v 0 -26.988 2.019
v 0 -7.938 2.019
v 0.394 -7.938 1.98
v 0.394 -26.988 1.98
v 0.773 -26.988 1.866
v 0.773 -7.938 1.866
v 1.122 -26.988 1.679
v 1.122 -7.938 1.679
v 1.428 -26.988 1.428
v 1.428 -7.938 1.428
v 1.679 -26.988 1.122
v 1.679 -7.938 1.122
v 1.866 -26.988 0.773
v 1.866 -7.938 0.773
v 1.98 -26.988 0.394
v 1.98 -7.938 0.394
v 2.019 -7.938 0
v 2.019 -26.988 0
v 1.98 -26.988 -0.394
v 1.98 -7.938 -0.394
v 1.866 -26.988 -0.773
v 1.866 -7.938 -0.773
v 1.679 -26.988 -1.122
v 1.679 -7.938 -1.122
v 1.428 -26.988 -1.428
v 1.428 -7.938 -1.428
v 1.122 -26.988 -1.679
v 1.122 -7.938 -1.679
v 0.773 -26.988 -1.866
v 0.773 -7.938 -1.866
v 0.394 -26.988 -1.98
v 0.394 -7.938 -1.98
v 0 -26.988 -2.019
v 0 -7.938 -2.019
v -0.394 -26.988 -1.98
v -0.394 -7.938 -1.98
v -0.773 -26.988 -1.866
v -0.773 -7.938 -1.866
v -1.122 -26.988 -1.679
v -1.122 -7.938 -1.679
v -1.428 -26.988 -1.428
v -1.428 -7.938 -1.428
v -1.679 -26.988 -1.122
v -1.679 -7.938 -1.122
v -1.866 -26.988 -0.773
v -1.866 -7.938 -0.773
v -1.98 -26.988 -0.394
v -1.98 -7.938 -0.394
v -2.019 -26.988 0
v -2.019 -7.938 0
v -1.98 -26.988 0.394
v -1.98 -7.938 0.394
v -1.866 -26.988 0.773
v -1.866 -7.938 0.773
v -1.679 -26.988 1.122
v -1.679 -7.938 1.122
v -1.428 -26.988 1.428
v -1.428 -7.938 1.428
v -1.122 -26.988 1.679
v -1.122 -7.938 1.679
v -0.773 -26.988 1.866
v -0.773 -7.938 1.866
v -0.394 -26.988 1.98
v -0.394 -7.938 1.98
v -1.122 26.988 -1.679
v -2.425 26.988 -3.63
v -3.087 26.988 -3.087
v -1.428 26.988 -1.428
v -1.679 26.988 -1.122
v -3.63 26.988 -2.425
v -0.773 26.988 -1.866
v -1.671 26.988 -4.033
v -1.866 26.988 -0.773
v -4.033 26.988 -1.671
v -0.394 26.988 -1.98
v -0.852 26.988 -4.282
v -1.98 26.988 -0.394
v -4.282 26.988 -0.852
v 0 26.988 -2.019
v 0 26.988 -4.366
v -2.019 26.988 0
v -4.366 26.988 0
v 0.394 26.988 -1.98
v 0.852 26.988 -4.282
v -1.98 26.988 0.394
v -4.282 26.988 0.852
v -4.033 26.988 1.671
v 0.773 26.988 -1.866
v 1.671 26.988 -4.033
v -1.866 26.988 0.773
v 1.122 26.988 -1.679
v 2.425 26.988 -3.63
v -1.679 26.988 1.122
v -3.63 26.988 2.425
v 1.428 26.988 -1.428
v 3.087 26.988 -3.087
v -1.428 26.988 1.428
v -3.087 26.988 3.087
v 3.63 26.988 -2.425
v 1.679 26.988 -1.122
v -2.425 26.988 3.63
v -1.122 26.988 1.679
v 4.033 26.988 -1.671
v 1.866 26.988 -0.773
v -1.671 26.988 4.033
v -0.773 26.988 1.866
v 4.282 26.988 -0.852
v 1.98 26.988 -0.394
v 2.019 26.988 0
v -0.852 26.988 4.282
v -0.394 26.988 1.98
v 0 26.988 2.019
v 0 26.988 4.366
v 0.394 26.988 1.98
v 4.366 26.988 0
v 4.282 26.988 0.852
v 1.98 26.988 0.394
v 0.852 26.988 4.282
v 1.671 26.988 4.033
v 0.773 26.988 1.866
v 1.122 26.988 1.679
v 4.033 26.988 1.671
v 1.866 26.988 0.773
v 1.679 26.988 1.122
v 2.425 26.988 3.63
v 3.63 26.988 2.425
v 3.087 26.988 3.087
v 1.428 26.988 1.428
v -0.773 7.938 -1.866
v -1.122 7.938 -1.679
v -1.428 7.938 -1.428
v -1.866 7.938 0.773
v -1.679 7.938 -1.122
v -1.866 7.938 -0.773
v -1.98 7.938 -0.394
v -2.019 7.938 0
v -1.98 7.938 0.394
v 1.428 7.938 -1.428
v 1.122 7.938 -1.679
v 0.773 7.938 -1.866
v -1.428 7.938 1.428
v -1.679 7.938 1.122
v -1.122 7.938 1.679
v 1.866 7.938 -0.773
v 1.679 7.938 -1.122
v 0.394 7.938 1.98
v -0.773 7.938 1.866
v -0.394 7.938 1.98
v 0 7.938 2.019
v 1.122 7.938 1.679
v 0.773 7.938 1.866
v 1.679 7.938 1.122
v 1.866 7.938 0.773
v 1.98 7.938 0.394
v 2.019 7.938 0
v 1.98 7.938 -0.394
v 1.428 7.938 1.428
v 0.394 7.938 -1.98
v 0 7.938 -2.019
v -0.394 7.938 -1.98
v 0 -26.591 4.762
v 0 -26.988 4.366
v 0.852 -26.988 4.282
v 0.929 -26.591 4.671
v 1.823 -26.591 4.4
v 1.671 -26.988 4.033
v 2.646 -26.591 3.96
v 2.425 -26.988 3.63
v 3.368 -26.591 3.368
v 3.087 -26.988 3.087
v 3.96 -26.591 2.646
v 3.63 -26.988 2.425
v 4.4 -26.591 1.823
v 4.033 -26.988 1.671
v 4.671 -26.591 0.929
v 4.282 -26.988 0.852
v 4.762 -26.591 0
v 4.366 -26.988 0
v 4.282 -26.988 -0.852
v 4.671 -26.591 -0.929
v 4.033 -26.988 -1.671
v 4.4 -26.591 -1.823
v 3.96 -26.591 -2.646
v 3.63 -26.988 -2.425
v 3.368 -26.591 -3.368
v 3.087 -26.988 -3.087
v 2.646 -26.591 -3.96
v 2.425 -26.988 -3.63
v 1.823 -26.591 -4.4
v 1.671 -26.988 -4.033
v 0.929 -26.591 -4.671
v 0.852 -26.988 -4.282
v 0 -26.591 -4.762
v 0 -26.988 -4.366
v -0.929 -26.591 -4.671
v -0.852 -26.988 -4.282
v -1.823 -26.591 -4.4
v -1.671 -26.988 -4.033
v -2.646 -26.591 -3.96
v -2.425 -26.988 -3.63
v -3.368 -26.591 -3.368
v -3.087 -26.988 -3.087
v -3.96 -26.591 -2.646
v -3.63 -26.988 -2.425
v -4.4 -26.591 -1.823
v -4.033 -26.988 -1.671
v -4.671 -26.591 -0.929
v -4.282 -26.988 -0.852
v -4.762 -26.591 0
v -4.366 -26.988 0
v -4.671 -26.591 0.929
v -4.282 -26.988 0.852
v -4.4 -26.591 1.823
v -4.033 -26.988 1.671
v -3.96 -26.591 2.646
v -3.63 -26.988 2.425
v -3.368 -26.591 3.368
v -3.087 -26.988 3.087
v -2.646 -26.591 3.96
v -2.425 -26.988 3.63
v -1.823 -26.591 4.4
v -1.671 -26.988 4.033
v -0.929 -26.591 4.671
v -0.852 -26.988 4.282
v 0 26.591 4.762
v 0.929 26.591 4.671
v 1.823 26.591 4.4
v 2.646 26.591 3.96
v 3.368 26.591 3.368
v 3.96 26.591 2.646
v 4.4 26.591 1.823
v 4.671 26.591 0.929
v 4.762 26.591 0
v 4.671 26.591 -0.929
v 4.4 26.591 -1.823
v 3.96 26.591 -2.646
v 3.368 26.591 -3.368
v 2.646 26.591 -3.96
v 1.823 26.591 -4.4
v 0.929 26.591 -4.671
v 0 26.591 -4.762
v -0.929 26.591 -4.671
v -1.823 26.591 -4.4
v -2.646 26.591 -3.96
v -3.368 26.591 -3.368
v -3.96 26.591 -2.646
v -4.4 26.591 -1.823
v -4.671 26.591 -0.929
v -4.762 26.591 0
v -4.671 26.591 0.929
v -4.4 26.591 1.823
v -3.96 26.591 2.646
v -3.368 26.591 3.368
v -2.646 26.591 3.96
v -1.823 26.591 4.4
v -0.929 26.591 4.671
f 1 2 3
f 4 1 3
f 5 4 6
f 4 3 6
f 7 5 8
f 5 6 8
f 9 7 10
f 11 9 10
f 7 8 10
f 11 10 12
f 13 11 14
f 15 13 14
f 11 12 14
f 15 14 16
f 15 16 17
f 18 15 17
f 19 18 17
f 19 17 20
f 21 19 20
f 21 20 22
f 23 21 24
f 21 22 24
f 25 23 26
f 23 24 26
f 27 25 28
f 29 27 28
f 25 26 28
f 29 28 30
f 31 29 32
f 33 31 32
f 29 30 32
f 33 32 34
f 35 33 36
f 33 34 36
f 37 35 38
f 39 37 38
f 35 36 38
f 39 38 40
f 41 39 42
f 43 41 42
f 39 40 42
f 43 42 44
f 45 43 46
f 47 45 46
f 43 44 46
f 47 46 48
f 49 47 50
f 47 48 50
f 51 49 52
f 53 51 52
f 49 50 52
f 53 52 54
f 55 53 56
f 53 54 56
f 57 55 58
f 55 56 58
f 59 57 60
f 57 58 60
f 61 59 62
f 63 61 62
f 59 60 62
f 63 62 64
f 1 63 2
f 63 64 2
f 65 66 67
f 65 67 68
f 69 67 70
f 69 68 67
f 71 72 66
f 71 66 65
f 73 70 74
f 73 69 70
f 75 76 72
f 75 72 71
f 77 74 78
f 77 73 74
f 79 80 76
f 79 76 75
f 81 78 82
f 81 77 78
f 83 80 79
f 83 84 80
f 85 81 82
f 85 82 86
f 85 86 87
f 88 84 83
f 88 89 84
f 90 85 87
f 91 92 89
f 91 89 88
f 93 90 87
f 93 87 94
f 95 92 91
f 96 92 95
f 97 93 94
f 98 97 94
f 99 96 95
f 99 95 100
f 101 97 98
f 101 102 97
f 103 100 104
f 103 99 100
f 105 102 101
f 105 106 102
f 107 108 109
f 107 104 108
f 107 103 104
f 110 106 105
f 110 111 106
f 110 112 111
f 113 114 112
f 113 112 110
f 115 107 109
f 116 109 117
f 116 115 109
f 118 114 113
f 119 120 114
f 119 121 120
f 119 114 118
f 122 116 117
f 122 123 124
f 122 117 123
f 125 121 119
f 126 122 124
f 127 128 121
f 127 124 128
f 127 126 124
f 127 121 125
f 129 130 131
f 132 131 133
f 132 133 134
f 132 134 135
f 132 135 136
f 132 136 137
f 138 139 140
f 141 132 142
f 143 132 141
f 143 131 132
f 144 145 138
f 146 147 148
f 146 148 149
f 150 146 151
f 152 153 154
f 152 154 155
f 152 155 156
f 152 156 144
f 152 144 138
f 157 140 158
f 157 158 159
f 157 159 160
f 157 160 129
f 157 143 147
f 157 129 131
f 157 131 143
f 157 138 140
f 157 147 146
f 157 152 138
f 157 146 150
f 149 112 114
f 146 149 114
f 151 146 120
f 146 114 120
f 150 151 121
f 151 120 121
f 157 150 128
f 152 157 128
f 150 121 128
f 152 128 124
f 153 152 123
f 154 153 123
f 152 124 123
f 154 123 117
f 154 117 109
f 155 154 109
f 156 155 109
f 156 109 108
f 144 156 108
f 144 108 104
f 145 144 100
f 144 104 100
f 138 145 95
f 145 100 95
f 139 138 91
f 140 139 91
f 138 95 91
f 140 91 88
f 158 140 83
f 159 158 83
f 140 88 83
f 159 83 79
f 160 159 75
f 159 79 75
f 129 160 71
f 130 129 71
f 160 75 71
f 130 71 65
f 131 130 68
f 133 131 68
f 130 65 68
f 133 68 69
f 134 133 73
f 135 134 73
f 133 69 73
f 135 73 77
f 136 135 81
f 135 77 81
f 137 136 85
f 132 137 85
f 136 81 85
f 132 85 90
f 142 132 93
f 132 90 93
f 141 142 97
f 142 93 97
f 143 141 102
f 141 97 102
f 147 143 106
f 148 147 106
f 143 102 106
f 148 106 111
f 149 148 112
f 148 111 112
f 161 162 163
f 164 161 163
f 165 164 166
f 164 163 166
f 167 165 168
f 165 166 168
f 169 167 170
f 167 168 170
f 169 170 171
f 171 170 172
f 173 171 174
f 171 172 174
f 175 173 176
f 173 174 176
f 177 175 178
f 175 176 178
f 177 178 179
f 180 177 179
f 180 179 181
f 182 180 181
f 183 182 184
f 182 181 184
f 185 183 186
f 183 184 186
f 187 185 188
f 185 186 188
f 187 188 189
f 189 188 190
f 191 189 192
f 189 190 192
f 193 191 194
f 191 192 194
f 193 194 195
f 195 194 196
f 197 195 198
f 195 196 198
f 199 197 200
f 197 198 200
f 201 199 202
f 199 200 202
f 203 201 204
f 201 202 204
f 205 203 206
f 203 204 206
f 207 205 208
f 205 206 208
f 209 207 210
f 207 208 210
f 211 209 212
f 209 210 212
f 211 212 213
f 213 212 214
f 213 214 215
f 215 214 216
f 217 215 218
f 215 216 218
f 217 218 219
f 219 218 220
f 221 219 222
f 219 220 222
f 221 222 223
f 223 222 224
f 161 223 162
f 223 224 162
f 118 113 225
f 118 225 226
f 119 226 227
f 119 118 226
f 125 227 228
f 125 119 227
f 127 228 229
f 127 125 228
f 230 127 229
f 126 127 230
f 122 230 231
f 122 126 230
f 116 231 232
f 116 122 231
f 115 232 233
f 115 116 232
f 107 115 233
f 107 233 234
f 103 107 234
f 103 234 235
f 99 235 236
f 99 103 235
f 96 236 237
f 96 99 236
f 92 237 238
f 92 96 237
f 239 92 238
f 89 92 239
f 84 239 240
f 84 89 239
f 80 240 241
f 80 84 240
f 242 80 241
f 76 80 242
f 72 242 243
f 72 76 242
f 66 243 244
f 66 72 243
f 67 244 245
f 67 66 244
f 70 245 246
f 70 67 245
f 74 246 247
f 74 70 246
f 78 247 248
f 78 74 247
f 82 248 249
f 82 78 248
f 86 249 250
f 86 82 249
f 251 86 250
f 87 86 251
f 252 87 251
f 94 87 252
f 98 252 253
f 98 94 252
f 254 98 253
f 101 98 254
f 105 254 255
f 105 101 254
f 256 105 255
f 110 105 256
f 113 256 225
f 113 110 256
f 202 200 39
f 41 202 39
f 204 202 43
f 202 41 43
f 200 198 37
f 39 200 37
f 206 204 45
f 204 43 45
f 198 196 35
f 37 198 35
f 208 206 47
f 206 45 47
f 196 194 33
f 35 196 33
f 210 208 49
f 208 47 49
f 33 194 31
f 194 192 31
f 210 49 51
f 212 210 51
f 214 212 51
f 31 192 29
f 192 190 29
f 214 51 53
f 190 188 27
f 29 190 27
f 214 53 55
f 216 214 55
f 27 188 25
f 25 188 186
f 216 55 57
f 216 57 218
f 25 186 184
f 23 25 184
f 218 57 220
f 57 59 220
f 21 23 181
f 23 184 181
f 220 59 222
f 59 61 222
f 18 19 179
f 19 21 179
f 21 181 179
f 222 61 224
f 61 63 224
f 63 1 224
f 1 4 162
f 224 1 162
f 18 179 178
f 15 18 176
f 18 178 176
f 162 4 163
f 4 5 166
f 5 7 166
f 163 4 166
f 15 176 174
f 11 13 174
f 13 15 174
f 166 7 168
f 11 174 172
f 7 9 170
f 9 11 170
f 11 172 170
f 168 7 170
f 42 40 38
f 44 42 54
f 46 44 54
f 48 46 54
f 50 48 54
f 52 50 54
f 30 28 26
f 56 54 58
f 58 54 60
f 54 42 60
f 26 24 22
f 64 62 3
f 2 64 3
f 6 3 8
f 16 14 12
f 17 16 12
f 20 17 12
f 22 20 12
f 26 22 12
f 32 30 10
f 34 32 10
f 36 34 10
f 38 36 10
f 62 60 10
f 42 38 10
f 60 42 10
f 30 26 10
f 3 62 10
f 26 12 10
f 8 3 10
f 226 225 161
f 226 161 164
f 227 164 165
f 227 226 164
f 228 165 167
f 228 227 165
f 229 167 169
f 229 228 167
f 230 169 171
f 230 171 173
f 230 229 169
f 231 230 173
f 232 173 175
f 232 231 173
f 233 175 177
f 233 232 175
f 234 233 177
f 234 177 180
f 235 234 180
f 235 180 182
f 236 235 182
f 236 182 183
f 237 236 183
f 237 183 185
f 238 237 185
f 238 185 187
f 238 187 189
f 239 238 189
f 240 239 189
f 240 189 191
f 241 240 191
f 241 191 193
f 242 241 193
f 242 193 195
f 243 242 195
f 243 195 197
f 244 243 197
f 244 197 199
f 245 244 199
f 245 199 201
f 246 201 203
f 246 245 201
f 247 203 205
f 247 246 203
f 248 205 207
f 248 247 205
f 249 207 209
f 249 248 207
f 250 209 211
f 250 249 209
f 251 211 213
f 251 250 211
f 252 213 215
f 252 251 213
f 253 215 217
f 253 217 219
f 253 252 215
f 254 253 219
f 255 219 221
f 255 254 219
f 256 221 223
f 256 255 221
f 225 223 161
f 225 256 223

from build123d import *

# Parameters (mm, degrees)
CROQUIS2_R              = 4.7625
SALIENTE_EXTRUIR1_DEPTH = 26.9875
CHAFL_N1_SIZE           = 0.396875
TAP_START               = 26.9875
CROQUIS3_R              = 2.0193
TAP_HOLE_1_DEPTH        = 19.05
TAP_START_2             = -7.9375
CROQUIS3_2_R            = 2.0193
TAP_HOLE_2_DEPTH        = 19.05


with BuildPart() as part:
    # Croquis2 → Saliente-Extruir1 (new, symmetric)
    with BuildSketch(Plane(origin=(0, 0, 0), x_dir=(1, 0, 0), z_dir=(0, 1, 0))):
        with Locations(Location((0, 0, 0), (0, 0, 270))):
            Circle(CROQUIS2_R)
    extrude(amount=SALIENTE_EXTRUIR1_DEPTH, both=True)

    # Chaflán1
    chafl_n1_edges = [part.edges().sort_by_distance(p)[0] for p in [
        (0, -26.9875, -4.7625),
        (0, 26.9875, -4.7625),
    ]]
    chamfer(chafl_n1_edges, length=CHAFL_N1_SIZE)

    # Croquis3 → Tap Hole 1 (cut)
    with BuildSketch(Plane(origin=(0, 0, 0), x_dir=(1, 0, 0), z_dir=(0, 1, 0)).offset(TAP_START)):
        with Locations(Location((0, 0, 0), (0, 0, 270))):
            Circle(CROQUIS3_R)
    extrude(amount=-TAP_HOLE_1_DEPTH, mode=Mode.SUBTRACT)

    # Croquis3<2> → Tap Hole 2 (cut)
    with BuildSketch(Plane(origin=(0, 0, 0), x_dir=(1, 0, 0), z_dir=(0, 1, 0)).offset(TAP_START_2)):
        with Locations(Location((0, 0, 0), (0, 0, 270))):
            Circle(CROQUIS3_2_R)
    extrude(amount=-TAP_HOLE_2_DEPTH, mode=Mode.SUBTRACT)


solid = part.part
